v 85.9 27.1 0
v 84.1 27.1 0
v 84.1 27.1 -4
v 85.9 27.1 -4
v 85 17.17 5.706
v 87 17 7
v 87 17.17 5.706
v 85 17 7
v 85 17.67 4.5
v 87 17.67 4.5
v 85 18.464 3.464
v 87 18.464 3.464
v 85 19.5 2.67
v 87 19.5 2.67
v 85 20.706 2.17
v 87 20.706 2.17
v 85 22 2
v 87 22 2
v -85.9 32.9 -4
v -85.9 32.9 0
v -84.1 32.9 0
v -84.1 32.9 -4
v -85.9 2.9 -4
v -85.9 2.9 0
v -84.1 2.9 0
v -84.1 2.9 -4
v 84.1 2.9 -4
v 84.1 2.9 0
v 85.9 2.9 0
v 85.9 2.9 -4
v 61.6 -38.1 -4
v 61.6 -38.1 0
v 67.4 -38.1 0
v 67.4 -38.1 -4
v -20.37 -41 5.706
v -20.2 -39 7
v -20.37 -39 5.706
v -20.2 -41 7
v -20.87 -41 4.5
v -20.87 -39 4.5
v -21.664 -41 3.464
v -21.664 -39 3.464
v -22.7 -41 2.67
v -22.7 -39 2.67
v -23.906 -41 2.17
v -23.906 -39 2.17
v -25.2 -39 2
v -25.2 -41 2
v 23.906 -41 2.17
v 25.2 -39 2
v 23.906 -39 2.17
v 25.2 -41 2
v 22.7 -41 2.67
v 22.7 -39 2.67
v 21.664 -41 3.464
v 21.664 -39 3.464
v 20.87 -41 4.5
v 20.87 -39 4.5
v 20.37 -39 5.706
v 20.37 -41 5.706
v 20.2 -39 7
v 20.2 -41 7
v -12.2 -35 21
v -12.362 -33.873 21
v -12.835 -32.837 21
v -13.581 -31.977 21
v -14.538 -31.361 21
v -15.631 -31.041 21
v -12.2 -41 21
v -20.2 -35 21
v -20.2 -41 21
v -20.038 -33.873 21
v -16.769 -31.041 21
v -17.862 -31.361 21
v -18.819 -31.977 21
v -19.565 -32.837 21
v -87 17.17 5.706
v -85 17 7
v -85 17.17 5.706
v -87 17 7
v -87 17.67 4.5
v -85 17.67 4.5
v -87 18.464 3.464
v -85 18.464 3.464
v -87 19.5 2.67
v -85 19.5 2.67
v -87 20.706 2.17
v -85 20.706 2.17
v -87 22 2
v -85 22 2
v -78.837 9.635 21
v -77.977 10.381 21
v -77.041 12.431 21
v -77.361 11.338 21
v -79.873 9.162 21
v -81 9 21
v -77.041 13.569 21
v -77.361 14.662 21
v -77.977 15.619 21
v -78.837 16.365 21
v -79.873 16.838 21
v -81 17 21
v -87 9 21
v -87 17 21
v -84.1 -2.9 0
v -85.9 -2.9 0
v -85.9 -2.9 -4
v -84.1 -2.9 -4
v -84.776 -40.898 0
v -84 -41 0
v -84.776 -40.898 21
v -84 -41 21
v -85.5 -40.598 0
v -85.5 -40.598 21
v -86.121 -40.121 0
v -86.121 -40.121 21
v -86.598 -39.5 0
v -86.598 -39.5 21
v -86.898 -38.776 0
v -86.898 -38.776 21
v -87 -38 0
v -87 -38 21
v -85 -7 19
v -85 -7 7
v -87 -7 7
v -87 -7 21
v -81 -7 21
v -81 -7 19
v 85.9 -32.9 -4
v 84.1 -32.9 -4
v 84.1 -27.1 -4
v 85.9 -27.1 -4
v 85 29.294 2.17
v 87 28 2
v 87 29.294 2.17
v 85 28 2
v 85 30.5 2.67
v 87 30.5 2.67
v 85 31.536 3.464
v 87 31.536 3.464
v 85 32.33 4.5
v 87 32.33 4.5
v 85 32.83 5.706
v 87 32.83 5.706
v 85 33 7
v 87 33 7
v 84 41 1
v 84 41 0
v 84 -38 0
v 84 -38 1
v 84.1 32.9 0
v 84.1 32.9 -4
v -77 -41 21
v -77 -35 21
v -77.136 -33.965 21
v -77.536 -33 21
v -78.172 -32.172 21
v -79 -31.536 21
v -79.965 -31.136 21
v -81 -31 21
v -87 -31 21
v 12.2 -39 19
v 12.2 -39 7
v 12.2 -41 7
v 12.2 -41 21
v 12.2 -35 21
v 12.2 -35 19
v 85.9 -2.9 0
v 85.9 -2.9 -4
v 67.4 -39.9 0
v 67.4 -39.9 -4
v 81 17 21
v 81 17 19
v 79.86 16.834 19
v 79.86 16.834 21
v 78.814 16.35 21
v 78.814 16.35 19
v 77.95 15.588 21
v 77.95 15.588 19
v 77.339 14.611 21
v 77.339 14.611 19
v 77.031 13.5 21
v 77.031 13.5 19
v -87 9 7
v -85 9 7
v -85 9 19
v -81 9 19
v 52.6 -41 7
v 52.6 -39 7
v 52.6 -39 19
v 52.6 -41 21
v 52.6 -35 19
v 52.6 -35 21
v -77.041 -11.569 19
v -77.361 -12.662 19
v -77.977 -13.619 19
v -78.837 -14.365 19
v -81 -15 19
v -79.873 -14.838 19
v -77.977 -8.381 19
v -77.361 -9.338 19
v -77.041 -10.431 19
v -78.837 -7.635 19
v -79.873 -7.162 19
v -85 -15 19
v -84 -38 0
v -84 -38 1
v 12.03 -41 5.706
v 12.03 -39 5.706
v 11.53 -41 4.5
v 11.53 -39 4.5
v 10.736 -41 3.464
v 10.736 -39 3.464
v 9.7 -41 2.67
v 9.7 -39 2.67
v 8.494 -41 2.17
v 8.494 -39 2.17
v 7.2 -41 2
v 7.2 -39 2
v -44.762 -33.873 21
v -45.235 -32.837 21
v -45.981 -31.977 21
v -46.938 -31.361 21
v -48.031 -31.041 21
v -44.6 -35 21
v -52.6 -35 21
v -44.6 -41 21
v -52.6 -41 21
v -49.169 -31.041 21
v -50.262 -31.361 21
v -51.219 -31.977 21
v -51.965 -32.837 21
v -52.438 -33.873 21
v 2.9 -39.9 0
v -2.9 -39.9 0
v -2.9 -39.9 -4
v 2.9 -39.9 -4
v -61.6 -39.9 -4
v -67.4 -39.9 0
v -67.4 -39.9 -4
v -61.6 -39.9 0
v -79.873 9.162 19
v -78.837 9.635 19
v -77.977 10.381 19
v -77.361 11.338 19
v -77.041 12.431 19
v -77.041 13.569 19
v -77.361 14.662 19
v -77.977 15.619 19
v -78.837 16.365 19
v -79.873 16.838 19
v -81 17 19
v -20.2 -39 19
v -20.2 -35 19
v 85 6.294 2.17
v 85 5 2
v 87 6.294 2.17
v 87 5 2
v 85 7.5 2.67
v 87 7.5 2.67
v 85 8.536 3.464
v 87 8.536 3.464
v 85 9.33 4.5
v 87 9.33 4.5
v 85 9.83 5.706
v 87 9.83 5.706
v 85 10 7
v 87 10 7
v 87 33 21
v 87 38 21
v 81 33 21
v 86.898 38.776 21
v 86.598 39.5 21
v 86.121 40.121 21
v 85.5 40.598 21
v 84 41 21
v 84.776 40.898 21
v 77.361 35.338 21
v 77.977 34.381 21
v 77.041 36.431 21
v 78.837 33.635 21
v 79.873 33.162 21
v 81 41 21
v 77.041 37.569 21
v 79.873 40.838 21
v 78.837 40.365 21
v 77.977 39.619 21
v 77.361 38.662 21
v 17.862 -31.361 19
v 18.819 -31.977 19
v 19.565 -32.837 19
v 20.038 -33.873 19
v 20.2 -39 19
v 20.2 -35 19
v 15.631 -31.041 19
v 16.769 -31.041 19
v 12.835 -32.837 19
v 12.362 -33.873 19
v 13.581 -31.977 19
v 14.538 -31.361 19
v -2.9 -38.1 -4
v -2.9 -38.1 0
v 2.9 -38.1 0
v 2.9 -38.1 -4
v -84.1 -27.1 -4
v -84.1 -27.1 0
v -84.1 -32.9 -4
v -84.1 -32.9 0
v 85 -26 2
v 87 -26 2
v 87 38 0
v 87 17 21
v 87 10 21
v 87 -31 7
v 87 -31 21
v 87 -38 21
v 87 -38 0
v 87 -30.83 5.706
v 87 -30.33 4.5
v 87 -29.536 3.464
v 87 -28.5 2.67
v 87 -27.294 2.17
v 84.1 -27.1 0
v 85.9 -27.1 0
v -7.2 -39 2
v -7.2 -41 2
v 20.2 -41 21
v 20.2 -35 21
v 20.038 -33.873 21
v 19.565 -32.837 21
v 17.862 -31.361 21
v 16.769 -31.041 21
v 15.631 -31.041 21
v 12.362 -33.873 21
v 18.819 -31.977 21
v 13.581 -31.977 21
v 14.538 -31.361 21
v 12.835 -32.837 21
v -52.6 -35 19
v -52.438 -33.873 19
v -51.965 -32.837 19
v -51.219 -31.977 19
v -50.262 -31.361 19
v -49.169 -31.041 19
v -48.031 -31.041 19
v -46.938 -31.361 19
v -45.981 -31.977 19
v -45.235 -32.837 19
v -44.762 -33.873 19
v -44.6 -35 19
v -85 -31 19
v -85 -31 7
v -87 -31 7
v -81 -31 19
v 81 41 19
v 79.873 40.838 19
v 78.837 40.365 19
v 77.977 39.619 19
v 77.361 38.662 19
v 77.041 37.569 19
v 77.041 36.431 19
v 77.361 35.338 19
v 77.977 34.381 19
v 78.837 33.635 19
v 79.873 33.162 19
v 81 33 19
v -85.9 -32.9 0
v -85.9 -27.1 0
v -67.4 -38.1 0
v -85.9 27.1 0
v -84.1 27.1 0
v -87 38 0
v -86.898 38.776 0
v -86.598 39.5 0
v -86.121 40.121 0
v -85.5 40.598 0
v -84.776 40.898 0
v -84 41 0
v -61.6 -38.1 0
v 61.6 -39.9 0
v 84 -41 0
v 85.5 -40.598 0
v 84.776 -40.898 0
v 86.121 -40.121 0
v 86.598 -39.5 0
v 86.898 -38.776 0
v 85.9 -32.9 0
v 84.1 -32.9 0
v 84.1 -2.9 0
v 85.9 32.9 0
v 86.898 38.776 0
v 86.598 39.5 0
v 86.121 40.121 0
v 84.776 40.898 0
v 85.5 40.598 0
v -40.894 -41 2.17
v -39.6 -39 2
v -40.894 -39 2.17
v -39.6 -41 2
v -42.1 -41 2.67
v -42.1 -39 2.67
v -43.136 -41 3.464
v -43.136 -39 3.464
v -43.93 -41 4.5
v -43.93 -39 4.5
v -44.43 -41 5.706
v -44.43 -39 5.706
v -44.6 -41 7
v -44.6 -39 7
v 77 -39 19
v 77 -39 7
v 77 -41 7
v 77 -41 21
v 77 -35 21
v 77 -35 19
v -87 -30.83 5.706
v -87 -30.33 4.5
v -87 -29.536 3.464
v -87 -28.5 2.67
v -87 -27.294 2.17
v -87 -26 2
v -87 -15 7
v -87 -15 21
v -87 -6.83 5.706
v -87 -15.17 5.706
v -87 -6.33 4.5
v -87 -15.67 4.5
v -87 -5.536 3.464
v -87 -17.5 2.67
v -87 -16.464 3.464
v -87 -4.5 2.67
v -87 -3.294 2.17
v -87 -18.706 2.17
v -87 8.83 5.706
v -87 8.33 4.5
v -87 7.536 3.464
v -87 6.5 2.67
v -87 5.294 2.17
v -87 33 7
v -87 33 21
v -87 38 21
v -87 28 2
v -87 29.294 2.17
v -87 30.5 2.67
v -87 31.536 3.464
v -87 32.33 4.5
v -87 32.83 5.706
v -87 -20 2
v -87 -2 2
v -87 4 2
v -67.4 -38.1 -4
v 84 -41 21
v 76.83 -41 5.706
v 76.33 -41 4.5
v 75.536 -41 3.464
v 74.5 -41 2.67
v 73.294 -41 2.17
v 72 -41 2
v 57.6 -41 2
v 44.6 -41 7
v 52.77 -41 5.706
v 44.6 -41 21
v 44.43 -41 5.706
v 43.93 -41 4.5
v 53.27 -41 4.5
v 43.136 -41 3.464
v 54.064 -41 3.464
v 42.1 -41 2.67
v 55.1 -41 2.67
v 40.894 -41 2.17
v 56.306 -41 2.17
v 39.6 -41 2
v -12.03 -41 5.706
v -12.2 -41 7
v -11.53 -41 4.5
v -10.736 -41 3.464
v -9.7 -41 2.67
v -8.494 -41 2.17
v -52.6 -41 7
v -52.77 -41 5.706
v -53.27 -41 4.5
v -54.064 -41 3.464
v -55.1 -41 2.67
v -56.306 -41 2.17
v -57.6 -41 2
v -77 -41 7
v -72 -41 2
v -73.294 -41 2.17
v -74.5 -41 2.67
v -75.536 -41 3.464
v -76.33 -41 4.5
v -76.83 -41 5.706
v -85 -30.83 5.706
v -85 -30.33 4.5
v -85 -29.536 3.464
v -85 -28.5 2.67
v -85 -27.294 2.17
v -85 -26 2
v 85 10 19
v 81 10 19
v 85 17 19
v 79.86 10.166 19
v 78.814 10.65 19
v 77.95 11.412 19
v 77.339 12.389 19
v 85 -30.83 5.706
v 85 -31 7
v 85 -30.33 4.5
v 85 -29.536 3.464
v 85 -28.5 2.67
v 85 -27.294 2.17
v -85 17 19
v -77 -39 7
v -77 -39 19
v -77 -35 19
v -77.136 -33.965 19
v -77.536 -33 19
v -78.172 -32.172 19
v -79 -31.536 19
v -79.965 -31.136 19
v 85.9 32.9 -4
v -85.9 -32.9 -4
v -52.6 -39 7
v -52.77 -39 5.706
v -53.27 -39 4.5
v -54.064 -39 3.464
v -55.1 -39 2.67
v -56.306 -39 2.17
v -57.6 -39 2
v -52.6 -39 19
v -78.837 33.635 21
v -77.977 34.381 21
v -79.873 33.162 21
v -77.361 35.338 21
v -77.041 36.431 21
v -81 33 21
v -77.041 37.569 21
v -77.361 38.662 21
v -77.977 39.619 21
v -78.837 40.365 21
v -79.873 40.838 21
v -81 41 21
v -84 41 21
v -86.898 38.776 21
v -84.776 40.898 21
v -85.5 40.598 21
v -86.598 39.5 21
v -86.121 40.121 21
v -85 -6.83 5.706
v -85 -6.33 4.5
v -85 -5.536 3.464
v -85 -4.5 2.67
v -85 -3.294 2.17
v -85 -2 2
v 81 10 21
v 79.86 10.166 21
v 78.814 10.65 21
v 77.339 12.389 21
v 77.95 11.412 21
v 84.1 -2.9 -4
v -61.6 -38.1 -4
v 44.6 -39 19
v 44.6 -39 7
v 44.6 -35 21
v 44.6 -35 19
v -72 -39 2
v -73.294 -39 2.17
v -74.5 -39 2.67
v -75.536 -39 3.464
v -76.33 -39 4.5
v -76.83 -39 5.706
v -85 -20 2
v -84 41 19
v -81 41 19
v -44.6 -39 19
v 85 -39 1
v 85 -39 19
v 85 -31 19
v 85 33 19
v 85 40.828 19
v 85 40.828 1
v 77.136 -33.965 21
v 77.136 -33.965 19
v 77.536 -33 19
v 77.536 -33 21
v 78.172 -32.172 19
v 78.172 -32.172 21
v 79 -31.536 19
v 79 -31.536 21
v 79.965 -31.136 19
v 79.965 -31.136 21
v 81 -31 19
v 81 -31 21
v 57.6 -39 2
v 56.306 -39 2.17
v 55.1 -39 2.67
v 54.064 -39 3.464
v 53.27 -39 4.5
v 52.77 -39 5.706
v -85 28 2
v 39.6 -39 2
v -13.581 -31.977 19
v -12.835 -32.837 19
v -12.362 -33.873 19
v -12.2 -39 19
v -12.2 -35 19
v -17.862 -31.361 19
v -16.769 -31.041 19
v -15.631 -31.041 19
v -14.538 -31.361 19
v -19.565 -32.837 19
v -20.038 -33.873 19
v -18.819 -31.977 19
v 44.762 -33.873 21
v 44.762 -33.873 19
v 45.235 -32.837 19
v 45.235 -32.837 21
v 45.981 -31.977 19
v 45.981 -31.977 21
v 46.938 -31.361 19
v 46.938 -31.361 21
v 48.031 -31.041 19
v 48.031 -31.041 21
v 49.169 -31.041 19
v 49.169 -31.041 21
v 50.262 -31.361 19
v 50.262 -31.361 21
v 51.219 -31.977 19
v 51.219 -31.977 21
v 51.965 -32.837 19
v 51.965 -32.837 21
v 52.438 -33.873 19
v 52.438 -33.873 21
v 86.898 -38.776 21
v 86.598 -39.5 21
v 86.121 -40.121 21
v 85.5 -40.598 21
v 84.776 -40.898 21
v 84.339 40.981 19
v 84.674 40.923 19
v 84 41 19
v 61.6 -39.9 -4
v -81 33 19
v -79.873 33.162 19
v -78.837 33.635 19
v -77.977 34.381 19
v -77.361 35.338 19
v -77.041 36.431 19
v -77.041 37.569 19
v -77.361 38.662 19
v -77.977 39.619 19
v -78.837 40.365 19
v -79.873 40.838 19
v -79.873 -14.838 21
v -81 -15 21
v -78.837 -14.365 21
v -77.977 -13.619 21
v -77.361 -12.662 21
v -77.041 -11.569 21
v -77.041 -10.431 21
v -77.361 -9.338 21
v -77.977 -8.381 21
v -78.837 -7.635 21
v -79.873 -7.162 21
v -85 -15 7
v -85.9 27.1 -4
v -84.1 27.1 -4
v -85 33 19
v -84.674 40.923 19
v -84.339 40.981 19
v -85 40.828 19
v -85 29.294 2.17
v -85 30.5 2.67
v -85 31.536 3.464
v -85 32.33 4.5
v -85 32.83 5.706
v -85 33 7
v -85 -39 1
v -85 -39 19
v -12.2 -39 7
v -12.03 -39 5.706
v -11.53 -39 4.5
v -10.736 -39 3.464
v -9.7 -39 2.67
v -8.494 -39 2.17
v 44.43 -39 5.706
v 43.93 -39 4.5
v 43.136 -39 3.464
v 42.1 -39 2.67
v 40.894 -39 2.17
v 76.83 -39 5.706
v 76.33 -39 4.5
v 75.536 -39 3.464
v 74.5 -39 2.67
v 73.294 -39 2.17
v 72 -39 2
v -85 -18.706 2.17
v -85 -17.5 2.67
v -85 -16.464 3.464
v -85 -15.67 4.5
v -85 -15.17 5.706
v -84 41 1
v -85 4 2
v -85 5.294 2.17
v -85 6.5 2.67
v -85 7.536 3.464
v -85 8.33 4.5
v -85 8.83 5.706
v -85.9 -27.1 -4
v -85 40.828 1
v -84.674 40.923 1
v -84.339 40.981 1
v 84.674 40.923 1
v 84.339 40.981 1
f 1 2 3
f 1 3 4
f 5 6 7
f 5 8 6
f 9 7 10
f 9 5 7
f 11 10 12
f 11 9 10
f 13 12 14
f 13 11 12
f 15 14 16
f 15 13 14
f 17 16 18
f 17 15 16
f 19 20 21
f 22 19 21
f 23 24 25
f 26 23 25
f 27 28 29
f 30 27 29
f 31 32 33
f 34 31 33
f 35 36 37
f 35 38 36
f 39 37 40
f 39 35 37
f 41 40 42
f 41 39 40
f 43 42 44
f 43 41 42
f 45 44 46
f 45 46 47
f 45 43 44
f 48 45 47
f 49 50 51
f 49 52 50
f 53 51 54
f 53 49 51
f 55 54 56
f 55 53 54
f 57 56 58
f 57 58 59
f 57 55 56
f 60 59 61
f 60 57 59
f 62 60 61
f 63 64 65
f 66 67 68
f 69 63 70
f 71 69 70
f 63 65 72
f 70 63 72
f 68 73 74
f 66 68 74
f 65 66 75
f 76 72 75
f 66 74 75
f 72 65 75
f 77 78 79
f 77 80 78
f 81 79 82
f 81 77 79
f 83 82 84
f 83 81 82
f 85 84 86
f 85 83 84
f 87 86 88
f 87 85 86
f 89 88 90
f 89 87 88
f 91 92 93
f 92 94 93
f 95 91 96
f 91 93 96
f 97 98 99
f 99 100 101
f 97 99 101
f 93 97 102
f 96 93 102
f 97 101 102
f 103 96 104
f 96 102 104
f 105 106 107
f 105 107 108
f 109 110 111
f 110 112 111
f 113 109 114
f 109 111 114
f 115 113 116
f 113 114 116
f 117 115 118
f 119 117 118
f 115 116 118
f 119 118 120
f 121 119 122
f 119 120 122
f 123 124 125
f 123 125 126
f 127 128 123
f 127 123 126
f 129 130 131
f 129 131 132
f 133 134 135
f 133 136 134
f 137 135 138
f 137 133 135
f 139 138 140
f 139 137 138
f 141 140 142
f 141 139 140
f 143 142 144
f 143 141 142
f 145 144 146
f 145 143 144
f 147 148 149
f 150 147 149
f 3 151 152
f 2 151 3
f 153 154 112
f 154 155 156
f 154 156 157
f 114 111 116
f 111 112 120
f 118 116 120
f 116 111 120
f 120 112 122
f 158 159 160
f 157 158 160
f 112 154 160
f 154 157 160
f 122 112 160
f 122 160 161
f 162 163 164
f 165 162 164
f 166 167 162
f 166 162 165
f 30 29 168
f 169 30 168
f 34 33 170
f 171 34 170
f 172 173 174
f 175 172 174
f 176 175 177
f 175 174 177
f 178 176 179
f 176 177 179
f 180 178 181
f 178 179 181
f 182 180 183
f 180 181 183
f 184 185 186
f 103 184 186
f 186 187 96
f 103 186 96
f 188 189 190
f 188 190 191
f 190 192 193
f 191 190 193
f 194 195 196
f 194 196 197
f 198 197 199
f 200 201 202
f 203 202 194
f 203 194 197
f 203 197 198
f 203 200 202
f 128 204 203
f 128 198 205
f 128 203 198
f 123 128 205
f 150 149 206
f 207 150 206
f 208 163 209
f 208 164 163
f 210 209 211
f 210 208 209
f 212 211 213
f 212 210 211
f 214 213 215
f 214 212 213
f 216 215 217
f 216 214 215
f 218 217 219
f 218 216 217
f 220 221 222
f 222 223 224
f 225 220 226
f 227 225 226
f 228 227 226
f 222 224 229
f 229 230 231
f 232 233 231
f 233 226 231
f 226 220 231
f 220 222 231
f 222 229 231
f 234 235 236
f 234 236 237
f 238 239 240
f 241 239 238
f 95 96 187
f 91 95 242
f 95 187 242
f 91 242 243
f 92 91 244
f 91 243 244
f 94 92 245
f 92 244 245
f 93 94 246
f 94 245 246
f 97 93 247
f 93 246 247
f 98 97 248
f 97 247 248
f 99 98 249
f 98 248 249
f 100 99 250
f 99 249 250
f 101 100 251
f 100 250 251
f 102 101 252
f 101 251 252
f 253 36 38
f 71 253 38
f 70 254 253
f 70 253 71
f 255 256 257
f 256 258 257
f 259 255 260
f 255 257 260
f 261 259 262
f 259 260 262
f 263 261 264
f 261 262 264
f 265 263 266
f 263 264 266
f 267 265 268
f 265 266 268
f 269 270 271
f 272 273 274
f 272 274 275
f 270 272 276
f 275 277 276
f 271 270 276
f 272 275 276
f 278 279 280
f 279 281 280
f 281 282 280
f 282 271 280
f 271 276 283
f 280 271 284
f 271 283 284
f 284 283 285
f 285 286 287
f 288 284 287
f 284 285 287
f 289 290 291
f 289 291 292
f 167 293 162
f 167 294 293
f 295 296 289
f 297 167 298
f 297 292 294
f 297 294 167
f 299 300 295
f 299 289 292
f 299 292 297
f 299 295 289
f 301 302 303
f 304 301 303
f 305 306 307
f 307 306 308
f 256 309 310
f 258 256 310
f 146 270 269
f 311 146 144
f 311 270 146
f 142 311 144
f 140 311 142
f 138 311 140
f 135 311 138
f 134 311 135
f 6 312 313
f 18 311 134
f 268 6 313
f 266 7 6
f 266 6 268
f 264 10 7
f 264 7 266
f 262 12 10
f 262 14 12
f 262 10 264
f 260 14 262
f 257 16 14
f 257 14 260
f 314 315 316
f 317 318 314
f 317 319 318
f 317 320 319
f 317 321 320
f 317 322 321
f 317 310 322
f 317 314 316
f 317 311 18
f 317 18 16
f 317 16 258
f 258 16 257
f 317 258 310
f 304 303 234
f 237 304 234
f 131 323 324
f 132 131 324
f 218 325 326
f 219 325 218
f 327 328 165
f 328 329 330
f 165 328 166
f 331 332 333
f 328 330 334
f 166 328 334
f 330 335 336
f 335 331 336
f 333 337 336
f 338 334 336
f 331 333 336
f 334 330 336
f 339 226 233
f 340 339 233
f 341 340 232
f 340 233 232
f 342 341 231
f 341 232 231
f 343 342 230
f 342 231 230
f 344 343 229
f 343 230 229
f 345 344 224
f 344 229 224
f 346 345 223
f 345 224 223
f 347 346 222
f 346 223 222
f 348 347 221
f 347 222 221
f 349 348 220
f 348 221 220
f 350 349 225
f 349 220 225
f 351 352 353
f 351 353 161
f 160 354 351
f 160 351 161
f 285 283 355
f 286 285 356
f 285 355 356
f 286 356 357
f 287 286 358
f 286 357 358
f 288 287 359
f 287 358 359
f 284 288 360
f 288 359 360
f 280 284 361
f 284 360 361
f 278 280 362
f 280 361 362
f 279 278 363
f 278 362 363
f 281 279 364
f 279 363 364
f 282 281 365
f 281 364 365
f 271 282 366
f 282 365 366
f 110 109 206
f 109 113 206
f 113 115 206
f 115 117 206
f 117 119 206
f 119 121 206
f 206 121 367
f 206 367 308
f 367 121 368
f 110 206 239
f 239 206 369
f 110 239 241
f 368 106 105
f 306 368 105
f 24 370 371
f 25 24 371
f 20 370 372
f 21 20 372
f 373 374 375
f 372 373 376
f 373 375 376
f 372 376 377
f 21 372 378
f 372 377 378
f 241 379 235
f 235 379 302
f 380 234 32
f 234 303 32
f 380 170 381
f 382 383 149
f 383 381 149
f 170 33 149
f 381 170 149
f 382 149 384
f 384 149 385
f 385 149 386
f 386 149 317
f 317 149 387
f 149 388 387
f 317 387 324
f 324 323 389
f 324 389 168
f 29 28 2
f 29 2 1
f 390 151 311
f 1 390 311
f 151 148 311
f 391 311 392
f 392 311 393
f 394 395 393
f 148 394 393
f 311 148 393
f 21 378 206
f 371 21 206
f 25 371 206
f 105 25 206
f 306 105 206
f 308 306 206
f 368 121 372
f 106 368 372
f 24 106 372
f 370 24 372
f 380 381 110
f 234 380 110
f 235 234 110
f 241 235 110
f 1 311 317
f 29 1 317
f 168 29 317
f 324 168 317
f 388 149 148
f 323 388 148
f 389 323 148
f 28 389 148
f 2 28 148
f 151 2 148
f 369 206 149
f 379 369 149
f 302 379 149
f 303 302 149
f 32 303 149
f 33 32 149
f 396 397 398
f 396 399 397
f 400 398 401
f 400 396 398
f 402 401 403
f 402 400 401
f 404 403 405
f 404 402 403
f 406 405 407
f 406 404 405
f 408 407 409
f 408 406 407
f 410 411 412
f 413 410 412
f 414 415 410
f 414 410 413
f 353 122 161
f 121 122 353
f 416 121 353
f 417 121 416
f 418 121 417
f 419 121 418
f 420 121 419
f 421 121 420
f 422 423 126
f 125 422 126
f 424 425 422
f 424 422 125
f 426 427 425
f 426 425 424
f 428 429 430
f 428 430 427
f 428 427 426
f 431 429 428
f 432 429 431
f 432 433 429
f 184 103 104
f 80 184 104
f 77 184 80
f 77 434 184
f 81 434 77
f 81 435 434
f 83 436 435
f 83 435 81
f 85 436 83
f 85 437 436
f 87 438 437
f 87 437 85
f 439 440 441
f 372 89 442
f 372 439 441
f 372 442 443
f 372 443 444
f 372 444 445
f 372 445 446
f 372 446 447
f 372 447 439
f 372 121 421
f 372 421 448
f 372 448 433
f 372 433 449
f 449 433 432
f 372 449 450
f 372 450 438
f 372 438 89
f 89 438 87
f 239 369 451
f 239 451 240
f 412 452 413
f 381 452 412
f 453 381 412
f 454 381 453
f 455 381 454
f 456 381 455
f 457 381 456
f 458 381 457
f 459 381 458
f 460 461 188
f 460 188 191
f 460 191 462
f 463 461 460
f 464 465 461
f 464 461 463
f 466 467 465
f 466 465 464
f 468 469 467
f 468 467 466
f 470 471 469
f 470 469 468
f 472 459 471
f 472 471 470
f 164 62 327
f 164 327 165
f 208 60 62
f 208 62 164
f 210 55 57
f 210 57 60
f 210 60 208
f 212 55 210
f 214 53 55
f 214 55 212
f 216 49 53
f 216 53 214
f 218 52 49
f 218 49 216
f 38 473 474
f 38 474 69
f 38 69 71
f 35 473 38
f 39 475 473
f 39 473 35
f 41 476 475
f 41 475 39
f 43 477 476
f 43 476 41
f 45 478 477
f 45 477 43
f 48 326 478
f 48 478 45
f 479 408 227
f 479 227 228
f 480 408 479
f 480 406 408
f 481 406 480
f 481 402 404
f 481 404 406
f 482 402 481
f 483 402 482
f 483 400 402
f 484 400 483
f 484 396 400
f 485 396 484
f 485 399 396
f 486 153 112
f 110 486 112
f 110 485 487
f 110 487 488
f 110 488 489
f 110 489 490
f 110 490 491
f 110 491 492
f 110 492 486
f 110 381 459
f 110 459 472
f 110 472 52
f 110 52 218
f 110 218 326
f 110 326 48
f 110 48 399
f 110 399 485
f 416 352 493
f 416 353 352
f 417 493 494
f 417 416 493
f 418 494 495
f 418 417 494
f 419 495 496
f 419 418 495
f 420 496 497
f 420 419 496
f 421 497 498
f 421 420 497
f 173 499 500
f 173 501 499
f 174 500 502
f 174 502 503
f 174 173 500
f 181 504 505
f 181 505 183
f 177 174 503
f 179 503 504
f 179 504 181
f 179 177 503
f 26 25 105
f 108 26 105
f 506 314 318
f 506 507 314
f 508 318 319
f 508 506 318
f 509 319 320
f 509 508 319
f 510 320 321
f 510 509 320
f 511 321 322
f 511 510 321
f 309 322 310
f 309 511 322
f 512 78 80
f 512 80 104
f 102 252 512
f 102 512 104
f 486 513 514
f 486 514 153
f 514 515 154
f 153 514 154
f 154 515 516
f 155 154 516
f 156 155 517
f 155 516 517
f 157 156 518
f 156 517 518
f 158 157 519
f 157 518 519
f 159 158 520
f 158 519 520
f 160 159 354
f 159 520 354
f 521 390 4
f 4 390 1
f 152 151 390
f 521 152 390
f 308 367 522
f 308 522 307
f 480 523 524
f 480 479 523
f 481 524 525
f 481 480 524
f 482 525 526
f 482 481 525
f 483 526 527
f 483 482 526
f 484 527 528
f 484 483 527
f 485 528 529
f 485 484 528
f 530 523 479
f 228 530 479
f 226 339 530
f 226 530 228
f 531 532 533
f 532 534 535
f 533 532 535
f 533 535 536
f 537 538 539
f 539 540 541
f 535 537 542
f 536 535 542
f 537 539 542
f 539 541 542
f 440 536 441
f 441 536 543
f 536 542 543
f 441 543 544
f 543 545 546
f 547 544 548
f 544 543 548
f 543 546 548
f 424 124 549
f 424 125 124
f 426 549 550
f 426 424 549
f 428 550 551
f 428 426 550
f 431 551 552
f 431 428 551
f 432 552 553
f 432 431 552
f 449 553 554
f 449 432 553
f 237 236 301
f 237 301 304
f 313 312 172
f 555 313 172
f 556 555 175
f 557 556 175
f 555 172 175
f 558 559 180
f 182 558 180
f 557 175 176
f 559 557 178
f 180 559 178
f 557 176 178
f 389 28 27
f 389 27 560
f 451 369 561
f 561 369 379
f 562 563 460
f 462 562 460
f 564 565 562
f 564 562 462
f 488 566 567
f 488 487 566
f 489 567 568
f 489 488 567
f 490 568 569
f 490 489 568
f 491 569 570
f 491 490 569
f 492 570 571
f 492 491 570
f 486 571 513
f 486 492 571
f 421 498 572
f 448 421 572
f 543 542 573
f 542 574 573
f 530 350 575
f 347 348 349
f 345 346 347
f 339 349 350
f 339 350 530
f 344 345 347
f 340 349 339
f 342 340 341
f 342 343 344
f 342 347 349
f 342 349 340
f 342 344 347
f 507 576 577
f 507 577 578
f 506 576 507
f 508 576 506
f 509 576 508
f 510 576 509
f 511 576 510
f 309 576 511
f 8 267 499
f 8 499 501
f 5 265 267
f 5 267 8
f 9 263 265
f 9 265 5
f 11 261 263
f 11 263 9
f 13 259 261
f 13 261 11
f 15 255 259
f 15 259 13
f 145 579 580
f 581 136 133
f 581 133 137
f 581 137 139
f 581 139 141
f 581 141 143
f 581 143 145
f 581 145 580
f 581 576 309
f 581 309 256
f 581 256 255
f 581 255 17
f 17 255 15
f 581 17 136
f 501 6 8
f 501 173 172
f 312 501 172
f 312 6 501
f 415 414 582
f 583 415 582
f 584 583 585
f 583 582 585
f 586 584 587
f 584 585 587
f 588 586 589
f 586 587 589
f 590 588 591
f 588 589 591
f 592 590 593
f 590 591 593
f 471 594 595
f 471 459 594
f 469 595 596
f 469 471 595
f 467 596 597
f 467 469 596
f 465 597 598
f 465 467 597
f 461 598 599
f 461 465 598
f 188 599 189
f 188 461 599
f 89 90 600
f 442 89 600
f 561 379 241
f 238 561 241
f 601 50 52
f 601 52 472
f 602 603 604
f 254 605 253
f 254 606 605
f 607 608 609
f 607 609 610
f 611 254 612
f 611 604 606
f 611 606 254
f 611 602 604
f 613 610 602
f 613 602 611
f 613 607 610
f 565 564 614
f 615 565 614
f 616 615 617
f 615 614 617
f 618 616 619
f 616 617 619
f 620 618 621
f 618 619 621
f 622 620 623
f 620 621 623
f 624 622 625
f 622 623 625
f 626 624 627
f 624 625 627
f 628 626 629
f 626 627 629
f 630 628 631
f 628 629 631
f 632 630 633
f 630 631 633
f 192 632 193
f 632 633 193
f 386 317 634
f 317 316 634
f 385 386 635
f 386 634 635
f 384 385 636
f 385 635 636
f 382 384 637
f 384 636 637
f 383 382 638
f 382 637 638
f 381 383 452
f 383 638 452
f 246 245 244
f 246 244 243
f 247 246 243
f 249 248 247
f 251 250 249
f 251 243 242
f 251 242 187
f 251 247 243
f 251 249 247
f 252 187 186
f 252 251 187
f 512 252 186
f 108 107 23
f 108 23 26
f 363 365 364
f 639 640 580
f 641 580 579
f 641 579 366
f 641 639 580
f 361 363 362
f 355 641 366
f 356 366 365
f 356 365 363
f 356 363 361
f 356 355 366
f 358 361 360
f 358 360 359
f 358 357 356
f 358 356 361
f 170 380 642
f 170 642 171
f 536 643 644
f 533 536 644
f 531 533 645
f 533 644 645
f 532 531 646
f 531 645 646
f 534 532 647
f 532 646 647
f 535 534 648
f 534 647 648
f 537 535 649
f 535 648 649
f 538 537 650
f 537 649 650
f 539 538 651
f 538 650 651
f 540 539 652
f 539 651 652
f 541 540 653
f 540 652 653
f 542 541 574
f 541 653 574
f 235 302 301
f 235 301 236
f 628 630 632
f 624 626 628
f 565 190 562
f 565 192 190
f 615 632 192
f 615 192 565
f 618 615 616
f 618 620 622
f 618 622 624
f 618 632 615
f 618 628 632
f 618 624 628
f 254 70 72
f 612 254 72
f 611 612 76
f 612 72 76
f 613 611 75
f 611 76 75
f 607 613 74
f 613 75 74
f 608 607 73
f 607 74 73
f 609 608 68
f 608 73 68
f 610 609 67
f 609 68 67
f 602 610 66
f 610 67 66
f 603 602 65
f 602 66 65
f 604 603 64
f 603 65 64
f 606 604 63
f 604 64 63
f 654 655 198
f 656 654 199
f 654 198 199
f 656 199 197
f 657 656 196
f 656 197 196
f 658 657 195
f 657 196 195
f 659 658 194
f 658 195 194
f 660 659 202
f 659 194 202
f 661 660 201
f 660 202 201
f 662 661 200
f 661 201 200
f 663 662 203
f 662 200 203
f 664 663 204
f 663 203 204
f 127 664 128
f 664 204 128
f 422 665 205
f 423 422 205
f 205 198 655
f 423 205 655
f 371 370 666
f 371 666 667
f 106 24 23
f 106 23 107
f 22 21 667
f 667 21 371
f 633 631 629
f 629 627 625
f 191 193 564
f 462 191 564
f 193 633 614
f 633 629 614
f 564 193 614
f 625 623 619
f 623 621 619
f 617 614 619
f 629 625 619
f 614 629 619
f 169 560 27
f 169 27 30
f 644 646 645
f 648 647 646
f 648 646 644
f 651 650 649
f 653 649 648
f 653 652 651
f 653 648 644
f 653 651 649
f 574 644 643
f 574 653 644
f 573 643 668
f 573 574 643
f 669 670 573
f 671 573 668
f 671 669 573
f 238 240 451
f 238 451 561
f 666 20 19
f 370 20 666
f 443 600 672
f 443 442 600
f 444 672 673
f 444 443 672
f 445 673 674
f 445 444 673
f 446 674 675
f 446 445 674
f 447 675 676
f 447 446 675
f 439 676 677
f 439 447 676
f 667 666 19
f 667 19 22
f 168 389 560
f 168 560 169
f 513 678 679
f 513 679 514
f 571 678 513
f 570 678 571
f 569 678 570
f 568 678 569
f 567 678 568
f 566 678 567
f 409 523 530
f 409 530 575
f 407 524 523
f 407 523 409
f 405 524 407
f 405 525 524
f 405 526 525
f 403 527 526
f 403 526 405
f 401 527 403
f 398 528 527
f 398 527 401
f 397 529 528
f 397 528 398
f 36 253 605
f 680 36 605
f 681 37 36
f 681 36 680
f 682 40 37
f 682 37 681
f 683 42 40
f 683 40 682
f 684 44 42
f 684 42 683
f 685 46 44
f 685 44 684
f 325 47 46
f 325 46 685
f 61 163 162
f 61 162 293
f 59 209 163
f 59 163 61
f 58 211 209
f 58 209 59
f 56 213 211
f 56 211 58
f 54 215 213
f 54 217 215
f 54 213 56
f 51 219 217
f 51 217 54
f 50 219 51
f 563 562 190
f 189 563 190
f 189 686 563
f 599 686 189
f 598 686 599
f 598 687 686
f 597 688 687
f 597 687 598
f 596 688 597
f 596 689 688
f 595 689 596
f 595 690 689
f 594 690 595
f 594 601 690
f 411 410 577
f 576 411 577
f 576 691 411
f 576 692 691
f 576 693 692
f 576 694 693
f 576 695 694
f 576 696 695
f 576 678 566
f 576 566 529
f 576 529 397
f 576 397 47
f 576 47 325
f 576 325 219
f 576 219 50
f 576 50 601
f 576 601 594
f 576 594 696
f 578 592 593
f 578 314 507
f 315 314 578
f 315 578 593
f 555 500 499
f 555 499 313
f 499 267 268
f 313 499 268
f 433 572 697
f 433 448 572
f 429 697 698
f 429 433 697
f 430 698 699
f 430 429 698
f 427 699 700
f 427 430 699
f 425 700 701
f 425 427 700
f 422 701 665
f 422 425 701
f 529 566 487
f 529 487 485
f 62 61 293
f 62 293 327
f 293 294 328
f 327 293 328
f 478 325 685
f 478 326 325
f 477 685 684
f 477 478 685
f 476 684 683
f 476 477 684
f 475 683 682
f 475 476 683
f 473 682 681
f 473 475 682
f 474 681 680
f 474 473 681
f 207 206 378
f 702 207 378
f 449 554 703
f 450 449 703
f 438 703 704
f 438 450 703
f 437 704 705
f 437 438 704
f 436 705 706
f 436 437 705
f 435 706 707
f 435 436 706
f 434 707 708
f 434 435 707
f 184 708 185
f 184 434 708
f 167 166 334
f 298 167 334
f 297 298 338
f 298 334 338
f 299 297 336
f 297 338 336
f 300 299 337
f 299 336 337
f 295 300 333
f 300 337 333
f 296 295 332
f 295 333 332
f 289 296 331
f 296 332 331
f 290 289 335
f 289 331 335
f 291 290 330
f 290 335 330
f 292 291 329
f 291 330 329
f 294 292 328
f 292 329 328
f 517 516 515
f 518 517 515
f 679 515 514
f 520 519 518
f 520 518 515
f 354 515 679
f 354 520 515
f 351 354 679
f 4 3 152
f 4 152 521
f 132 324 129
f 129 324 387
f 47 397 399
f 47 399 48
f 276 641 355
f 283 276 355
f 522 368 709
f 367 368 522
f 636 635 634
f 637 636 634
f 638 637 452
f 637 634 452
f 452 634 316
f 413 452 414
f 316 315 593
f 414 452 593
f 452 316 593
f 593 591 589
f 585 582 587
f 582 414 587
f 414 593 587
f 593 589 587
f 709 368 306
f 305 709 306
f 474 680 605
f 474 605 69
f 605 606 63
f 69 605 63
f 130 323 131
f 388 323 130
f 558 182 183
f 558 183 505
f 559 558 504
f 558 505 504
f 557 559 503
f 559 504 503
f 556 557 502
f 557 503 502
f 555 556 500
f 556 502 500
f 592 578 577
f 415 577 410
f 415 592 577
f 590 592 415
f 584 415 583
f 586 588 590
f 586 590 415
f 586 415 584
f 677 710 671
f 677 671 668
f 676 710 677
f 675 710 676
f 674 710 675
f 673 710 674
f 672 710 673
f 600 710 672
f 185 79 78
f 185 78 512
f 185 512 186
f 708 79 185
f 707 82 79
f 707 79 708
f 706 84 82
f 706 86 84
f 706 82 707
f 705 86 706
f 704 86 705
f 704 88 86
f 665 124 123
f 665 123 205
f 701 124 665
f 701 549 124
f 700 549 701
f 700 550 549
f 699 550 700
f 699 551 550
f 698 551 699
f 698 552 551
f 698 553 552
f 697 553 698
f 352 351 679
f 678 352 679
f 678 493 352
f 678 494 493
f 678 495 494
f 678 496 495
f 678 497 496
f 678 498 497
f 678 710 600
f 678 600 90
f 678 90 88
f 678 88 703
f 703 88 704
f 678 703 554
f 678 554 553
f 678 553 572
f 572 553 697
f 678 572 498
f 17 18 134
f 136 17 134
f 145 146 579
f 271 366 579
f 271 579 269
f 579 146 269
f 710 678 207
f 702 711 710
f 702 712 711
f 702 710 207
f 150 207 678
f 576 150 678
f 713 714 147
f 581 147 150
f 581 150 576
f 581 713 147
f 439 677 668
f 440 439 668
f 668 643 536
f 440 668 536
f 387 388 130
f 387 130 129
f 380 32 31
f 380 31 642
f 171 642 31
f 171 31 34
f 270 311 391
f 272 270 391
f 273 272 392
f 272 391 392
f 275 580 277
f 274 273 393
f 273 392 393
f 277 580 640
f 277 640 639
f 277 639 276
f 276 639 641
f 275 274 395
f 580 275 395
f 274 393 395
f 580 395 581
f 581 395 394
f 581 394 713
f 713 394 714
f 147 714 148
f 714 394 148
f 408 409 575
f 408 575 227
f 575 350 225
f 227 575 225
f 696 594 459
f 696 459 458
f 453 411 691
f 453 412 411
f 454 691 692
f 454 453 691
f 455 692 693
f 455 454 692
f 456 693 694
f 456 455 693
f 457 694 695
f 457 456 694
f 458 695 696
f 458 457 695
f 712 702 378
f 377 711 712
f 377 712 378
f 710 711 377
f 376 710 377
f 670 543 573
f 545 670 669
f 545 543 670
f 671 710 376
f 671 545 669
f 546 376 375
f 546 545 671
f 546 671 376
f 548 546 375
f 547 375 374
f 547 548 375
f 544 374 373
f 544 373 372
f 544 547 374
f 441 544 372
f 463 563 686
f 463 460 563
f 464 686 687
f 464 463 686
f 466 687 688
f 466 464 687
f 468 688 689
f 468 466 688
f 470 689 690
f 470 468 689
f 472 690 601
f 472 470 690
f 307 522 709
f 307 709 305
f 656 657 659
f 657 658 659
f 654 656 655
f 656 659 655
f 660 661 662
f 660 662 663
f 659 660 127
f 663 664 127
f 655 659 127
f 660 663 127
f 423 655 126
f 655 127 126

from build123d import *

# Parameters (mm, degrees)
SKETCH9_W               = 1.8
SKETCH9_H               = 5.8
BOSS_EXTRUDE8_DEPTH     = 4
BOSS_EXTRUDE8_2_DEPTH   = 4
BOSS_EXTRUDE8_3_DEPTH   = 4
BOSS_EXTRUDE8_4_DEPTH   = 4
BOSS_EXTRUDE8_5_DEPTH   = 4
BOSS_EXTRUDE8_6_DEPTH   = 4
SKETCH9_W_2             = 5.8
SKETCH9_H_2             = 1.8
BOSS_EXTRUDE8_7_DEPTH   = 4
BOSS_EXTRUDE8_8_DEPTH   = 4
BOSS_EXTRUDE8_9_DEPTH   = 4
BOSS_EXTRUDE5_DEPTH     = 19
BOSS_EXTRUDE6_DEPTH     = 2
BOSS_EXTRUDE11_DEPTH    = 1
CUT_EXTRUDE6_DEPTH      = 99.442876837
CUT_EXTRUDE6_DEPTH_BACK = 99.442876837
SKETCH18_W              = 19
SKETCH18_H              = 16
SKETCH19_W              = 24.4
SKETCH19_H              = 19
CUT_EXTRUDE8_DEPTH      = 99.442876837
CUT_EXTRUDE9_START      = -19
SKETCH10_W              = 10
SKETCH10_H              = 34
CUT_EXTRUDE9_DEPTH      = 19
FILLET3_R               = 4
FILLET4_R               = 5
FILLET5_R               = 3


with BuildPart() as part:
    # Sketch9 → Boss-Extrude8 (new body)
    with BuildSketch(Plane(origin=(0, 0, 0), x_dir=(1, 0, 0), z_dir=(0, 0, -1))):
        with Locations((-85, 30)):
            Rectangle(SKETCH9_W, SKETCH9_H)
    extrude(amount=BOSS_EXTRUDE8_DEPTH)



with BuildPart() as body_2:
    # Sketch9 → Boss-Extrude8 2 (new body)
    with BuildSketch(Plane(origin=(0, 0, 0), x_dir=(1, 0, 0), z_dir=(0, 0, -1))):
        with Locations((-85, 0)):
            Rectangle(SKETCH9_W, SKETCH9_H)
    extrude(amount=BOSS_EXTRUDE8_2_DEPTH)


with BuildPart() as body_3:
    # Sketch9 → Boss-Extrude8 3 (new body)
    with BuildSketch(Plane(origin=(0, 0, 0), x_dir=(1, 0, 0), z_dir=(0, 0, -1))):
        with Locations((-85, -30)):
            Rectangle(SKETCH9_W, SKETCH9_H)
    extrude(amount=BOSS_EXTRUDE8_3_DEPTH)


with BuildPart() as body_4:
    # Sketch9 → Boss-Extrude8 4 (new body)
    with BuildSketch(Plane(origin=(0, 0, 0), x_dir=(1, 0, 0), z_dir=(0, 0, -1))):
        with Locations((85, 30)):
            Rectangle(SKETCH9_W, SKETCH9_H)
    extrude(amount=BOSS_EXTRUDE8_4_DEPTH)


with BuildPart() as body_5:
    # Sketch9 → Boss-Extrude8 5 (new body)
    with BuildSketch(Plane(origin=(0, 0, 0), x_dir=(1, 0, 0), z_dir=(0, 0, -1))):
        with Locations((85, -30)):
            Rectangle(SKETCH9_W, SKETCH9_H)
    extrude(amount=BOSS_EXTRUDE8_5_DEPTH)


with BuildPart() as body_6:
    # Sketch9 → Boss-Extrude8 6 (new body)
    with BuildSketch(Plane(origin=(0, 0, 0), x_dir=(1, 0, 0), z_dir=(0, 0, -1))):
        with Locations((85, 0)):
            Rectangle(SKETCH9_W, SKETCH9_H)
    extrude(amount=BOSS_EXTRUDE8_6_DEPTH)


with BuildPart() as body_7:
    # Sketch9 → Boss-Extrude8 7 (new body)
    with BuildSketch(Plane(origin=(0, 0, 0), x_dir=(1, 0, 0), z_dir=(0, 0, -1))):
        with Locations((-64.5, 39)):
            Rectangle(SKETCH9_W_2, SKETCH9_H_2)
    extrude(amount=BOSS_EXTRUDE8_7_DEPTH)


with BuildPart() as body_8:
    # Sketch9 → Boss-Extrude8 8 (new body)
    with BuildSketch(Plane(origin=(0, 0, 0), x_dir=(1, 0, 0), z_dir=(0, 0, -1))):
        with Locations((0, 39)):
            Rectangle(SKETCH9_W_2, SKETCH9_H_2)
    extrude(amount=BOSS_EXTRUDE8_8_DEPTH)


with BuildPart() as body_9:
    # Sketch9 → Boss-Extrude8 9 (new body)
    with BuildSketch(Plane(origin=(0, 0, 0), x_dir=(1, 0, 0), z_dir=(0, 0, -1))):
        with Locations((64.5, 39)):
            Rectangle(SKETCH9_W_2, SKETCH9_H_2)
    extrude(amount=BOSS_EXTRUDE8_9_DEPTH)


with BuildPart() as part_1:
    add(part.part)

    add(body_2.part)  # Boss-Extrude5 merges body 2

    add(body_3.part)  # Boss-Extrude5 merges body 3

    add(body_4.part)  # Boss-Extrude5 merges body 4

    add(body_5.part)  # Boss-Extrude5 merges body 5

    add(body_6.part)  # Boss-Extrude5 merges body 6

    add(body_7.part)  # Boss-Extrude5 merges body 7

    add(body_8.part)  # Boss-Extrude5 merges body 8

    add(body_9.part)  # Boss-Extrude5 merges body 9
    # Sketch1 → Boss-Extrude5 (add)
    with BuildSketch(Plane.XY):
        Polygon((-87, 41), (-85, 41), (-85, -39), (85, -39), (85, 41), (87, 41), (87, -41), (-87, -41), align=None)
    extrude(amount=BOSS_EXTRUDE5_DEPTH)

    # Sketch7 → Boss-Extrude6 (add)
    with BuildSketch(Plane.XY.offset(19)):
        Polygon((-87, 41), (-77, 41), (-77, -31), (77, -31), (77, 41), (87, 41), (87, -41), (-87, -41), align=None)
    extrude(amount=BOSS_EXTRUDE6_DEPTH)

    # Sketch17 → Boss-Extrude11 (add)
    with BuildSketch(Plane.XY):
        Polygon((-84, 41), (-85, 41), (-85, -39), (85, -39), (85, 41), (84, 41), (84, -38), (-84, -38), align=None)
    extrude(amount=BOSS_EXTRUDE11_DEPTH)

    # Sketch18 → Cut-Extrude6 (cut, two sides: drawn at the far end of the back side and taken through both)
    with BuildSketch(Plane.ZY.offset(-CUT_EXTRUDE6_DEPTH_BACK)):
        with Locations((11.5, 25)):
            Rectangle(SKETCH18_W, SKETCH18_H)
        with Locations((11.5, 1)):
            Rectangle(SKETCH18_W, SKETCH18_H)
        with Locations((11.5, -23)):
            Rectangle(SKETCH18_W, SKETCH18_H)
    extrude(amount=CUT_EXTRUDE6_DEPTH + CUT_EXTRUDE6_DEPTH_BACK, mode=Mode.SUBTRACT)

    # Sketch19 → Cut-Extrude8 (cut, through all)
    with BuildSketch(Plane.XZ):
        with Locations((-64.8, 11.5)):
            Rectangle(SKETCH19_W, SKETCH19_H)
        with Locations((-32.4, 11.5)):
            Rectangle(SKETCH19_W, SKETCH19_H)
        with Locations((0, 11.5)):
            Rectangle(SKETCH19_W, SKETCH19_H)
        with Locations((32.4, 11.5)):
            Rectangle(SKETCH19_W, SKETCH19_H)
        with Locations((64.8, 11.5)):
            Rectangle(SKETCH19_W, SKETCH19_H)
    extrude(amount=CUT_EXTRUDE8_DEPTH, mode=Mode.SUBTRACT)

    # Sketch10 → Cut-Extrude9 (cut)
    with BuildSketch(Plane.XY.offset(21).offset(CUT_EXTRUDE9_START)):
        with Locations((82, -7)):
            Rectangle(SKETCH10_W, SKETCH10_H)
    extrude(amount=CUT_EXTRUDE9_DEPTH, mode=Mode.SUBTRACT)

    # Fillet3
    # the kernel refuses this fillet: 4 mm, written as the material it takes off along each edge
    with BuildSketch(Plane(origin=(77, 41, 9), x_dir=(0, -1, 0), z_dir=(0, 0, 1)), Plane(origin=(-77, 33, 9), x_dir=(0, 1, 0), z_dir=(0, 0, 1)), Plane(origin=(77, 17, 9), x_dir=(0, -1, 0), z_dir=(0, 0, 1)), Plane(origin=(-77, 17, 31), x_dir=(0, -1, 0), z_dir=(0, 0, -1)), Plane(origin=(-77, 9, 9), x_dir=(0, 1, 0), z_dir=(0, 0, 1)), Plane(origin=(-77, -7, 31), x_dir=(0, -1, 0), z_dir=(0, 0, -1)), Plane(origin=(-77, -15, 9), x_dir=(0, 1, 0), z_dir=(0, 0, 1)), Plane(origin=(-44.6, -31, 9), x_dir=(-1, 0, 0), z_dir=(0, 0, 1)), Plane(origin=(-12.2, -31, 9), x_dir=(-1, 0, 0), z_dir=(0, 0, 1)), Plane(origin=(20.2, -31, 9), x_dir=(-1, 0, 0), z_dir=(0, 0, 1)), Plane(origin=(52.6, -31, 9), x_dir=(-1, 0, 0), z_dir=(0, 0, 1)), Plane(origin=(77, 10, 9), x_dir=(1, 0, 0), z_dir=(0, 0, 1))) as fillet3_piece_1:
        with BuildLine():
            CenterArc((FILLET3_R, FILLET3_R), FILLET3_R, 180, 90)
            Line((0, FILLET3_R), (0, 0))
            Line((0, 0), (FILLET3_R, 0))
        make_face()
    extrude(amount=22, mode=Mode.SUBTRACT)
    with BuildSketch(Plane(origin=(-77, 41, 9), x_dir=(0, -1, 0), z_dir=(0, 0, 1)), Plane(origin=(77, 33, 31), x_dir=(1, 0, 0), z_dir=(0, 0, -1)), Plane(origin=(-77, -31, 9), x_dir=(0, -1, 0), z_dir=(0, 0, 1)), Plane(origin=(-52.6, -31, 31), x_dir=(0, -1, 0), z_dir=(0, 0, -1)), Plane(origin=(-20.2, -31, 31), x_dir=(0, -1, 0), z_dir=(0, 0, -1)), Plane(origin=(12.2, -31, 31), x_dir=(0, -1, 0), z_dir=(0, 0, -1)), Plane(origin=(44.6, -31, 31), x_dir=(0, -1, 0), z_dir=(0, 0, -1)), Plane(origin=(77, -31, 31), x_dir=(0, -1, 0), z_dir=(0, 0, -1))) as fillet3_piece_2:
        with BuildLine():
            CenterArc((FILLET3_R, -FILLET3_R), FILLET3_R, 90, 90)
            Line((0, -FILLET3_R), (0, 0))
            Line((0, 0), (FILLET3_R, 0))
        make_face()
    extrude(amount=22, mode=Mode.SUBTRACT)

    # Fillet4
    fillet4_edges = [part_1.edges().sort_by_distance(p)[0] for p in [
        (86, 17, 2),
        (-86, 17, 2),
        (86, 33, 2),
        (-86, 33, 2),
        (-86, -7, 2),
        (-86, 9, 2),
        (86, -31, 2),
        (-86, -31, 2),
        (-86, -15, 2),
        (-77, -40, 2),
        (-52.6, -40, 2),
        (-44.6, -40, 2),
        (-20.2, -40, 2),
        (-12.2, -40, 2),
        (12.2, -40, 2),
        (20.2, -40, 2),
        (44.6, -40, 2),
        (52.6, -40, 2),
        (77, -40, 2),
        (86, 10, 2),
    ]]
    fillet(fillet4_edges, radius=FILLET4_R)

    # Fillet5
    fillet5_edges = [part_1.edges().sort_by_distance(p)[0] for p in [
        (-87, 41, 10.5),
        (-87, -41, 10.5),
        (87, -41, 10.5),
        (87, 41, 10.5),
    ]]
    fillet(fillet5_edges, radius=FILLET5_R)


solid = part_1.part
